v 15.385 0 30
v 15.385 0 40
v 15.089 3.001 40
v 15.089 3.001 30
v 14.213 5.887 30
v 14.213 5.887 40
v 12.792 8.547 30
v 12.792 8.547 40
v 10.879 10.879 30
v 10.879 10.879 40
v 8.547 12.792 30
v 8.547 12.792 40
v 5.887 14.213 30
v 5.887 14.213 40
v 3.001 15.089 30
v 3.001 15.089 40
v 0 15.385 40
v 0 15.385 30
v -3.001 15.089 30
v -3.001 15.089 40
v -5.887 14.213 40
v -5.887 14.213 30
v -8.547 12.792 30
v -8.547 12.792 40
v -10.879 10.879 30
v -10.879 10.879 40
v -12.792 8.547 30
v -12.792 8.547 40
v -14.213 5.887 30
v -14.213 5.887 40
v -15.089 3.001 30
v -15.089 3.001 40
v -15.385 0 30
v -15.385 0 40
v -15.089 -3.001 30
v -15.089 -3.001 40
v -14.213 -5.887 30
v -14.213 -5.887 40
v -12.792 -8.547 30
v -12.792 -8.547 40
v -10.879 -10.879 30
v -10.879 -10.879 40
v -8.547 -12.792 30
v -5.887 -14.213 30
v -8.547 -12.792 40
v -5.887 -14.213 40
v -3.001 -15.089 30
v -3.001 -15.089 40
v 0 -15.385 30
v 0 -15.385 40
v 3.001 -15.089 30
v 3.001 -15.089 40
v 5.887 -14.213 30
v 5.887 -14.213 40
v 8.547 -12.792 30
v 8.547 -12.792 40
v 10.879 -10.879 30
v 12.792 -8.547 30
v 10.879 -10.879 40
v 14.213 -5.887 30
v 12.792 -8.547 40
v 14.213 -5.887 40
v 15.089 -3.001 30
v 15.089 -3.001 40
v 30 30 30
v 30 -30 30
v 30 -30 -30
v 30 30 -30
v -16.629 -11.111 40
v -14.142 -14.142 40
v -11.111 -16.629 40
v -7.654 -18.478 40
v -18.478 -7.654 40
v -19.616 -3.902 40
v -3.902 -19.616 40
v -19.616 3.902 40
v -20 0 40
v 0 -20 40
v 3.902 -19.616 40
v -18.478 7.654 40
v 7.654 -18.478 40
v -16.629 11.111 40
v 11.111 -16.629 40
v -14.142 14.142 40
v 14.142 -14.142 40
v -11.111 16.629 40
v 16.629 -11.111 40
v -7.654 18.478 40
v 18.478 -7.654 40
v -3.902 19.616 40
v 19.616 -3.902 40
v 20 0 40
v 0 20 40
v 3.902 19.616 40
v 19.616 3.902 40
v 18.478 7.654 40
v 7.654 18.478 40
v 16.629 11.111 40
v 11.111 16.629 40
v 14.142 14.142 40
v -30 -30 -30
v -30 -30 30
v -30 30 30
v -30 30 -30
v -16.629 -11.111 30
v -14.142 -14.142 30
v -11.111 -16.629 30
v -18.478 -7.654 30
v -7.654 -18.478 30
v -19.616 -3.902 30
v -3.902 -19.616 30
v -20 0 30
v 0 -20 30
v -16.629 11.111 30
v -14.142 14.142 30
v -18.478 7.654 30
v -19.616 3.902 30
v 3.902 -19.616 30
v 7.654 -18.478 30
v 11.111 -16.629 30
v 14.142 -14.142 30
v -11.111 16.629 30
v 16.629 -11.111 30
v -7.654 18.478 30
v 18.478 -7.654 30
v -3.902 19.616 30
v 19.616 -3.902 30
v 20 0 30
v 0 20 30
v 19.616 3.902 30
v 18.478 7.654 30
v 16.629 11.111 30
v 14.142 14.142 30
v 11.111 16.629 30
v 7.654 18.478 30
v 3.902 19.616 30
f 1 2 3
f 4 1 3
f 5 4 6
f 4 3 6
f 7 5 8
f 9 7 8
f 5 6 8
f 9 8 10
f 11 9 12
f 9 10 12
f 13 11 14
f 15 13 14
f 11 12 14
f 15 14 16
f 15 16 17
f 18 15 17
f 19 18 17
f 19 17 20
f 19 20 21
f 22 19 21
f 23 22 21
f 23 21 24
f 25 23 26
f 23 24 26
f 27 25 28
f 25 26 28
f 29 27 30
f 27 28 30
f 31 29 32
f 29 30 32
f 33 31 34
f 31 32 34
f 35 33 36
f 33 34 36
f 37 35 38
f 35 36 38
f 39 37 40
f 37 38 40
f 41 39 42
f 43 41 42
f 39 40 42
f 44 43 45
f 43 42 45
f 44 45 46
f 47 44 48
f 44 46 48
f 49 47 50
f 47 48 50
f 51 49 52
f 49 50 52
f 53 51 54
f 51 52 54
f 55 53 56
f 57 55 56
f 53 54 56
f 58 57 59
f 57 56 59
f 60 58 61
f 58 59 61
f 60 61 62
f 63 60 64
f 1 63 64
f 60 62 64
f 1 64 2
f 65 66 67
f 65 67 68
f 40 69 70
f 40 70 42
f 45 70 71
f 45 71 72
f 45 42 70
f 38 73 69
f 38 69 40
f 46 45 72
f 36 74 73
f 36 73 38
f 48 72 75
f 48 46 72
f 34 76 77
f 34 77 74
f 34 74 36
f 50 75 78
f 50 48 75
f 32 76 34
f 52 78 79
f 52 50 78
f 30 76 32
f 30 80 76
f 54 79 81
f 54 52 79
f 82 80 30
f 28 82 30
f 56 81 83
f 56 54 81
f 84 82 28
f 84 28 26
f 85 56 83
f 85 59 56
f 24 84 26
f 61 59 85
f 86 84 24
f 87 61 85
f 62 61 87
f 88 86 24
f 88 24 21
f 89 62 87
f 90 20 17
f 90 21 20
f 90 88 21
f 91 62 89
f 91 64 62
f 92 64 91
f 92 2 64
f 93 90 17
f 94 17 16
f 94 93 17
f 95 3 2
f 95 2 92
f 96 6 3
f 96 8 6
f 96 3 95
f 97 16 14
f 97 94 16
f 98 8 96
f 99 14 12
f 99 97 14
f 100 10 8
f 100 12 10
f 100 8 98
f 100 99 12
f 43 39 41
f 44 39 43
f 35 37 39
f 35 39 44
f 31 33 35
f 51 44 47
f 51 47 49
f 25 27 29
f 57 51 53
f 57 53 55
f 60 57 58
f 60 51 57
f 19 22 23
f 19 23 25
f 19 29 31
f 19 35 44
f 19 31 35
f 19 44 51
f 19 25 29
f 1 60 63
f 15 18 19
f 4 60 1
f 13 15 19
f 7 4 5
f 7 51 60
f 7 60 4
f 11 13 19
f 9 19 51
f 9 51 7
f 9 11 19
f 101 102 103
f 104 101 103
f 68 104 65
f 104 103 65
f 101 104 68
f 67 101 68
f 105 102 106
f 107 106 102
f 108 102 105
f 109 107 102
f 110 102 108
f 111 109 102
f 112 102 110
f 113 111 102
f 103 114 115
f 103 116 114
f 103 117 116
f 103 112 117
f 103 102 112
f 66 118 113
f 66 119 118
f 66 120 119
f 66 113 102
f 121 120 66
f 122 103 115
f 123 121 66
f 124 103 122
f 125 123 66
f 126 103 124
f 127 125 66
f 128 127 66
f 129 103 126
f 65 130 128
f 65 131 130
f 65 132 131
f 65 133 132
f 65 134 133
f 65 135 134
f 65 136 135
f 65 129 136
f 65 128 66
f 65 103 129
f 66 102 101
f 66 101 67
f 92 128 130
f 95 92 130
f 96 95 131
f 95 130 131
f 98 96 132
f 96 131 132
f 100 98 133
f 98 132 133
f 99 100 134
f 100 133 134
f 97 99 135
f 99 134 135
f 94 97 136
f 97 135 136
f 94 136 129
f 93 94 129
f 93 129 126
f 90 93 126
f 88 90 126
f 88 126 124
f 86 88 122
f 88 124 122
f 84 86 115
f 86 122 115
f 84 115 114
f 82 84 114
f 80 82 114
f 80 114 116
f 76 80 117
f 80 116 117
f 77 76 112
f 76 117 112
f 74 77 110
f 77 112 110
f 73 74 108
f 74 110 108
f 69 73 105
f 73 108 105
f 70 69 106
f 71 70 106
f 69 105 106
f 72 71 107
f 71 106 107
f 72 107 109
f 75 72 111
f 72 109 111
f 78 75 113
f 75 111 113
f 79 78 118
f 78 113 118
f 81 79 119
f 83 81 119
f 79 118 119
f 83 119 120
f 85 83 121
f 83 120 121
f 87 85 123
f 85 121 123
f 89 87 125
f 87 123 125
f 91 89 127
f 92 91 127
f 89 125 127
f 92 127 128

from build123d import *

# Parameters (mm, degrees)
F0_W     = 60
F0_H     = 60
F1_DEPTH = 30
F2_DEPTH = 30
F3_R     = 20
F4_DEPTH = 10
F6_R     = 15.3845355262
F7_DEPTH = 10
F8_W     = 60
F8_H     = 60
F9_DEPTH = 4


with BuildPart() as f1:
    # F0 (on Top) → F1 (new body)
    with BuildSketch(Plane.XY):
        Rectangle(F0_W, F0_H)
    extrude(amount=F1_DEPTH)

    # F2 (add): a face of the model
    f2_faces = [f1.faces().sort_by_distance(p)[0] for p in [
        (0, 0, 0),
    ]]
    extrude(f2_faces, amount=F2_DEPTH)

    # F3 (on face) → F4 (join)
    with BuildSketch(Plane.XY.offset(30)):
        Circle(F3_R)
    extrude(amount=F4_DEPTH)

    # F6 (on face) → F7 (cut)
    with BuildSketch(Plane.XY.offset(40)):
        Circle(F6_R)
    extrude(amount=-F7_DEPTH, mode=Mode.SUBTRACT)

    # F8 (on face) → F9 (cut)
    with BuildSketch(Plane(origin=(0, 30, 0), x_dir=(-1, 0, 0), z_dir=(0, 1, 0))):
        Rectangle(F8_W, F8_H)
    extrude(amount=F9_DEPTH, mode=Mode.SUBTRACT)


solid = f1.part
